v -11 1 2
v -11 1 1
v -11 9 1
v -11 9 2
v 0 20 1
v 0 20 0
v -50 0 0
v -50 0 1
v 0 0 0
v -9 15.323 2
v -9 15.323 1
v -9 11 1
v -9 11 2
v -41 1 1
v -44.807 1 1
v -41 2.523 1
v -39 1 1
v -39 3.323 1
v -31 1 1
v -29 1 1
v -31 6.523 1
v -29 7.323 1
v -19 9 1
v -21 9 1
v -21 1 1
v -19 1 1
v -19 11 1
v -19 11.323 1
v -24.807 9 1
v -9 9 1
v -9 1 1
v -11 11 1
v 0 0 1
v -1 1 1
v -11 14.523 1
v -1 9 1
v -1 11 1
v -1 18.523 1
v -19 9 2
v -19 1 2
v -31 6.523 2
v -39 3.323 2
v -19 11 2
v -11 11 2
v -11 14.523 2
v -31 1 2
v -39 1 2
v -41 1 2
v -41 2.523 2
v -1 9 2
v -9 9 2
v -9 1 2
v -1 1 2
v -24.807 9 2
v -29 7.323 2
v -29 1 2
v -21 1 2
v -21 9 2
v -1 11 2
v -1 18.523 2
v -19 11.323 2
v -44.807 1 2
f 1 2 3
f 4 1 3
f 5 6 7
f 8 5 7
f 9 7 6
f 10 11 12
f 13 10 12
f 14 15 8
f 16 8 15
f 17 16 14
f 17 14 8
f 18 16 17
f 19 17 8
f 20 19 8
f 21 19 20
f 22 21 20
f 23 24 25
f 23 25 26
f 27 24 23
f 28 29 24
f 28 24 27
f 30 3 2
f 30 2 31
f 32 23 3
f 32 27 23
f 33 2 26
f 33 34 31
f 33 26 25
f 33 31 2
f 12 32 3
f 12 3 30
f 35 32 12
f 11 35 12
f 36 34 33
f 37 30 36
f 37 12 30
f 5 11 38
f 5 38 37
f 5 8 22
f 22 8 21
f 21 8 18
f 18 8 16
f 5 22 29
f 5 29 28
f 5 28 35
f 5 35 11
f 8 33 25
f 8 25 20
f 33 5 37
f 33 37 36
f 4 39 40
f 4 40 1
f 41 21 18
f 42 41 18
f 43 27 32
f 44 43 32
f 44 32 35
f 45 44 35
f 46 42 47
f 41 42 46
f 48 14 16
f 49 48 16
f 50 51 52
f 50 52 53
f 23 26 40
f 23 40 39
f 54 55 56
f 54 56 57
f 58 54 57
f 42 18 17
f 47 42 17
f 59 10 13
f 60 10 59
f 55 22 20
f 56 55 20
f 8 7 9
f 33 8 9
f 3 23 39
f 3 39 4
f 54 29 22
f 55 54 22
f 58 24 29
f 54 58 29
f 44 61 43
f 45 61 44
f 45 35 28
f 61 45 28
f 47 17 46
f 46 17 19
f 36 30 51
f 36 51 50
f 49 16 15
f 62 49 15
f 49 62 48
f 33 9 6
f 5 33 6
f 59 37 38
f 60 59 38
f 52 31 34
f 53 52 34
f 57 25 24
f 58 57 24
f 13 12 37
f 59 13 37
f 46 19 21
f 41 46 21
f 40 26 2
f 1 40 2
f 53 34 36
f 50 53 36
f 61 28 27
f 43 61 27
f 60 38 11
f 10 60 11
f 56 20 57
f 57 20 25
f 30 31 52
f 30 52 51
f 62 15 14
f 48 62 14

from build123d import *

# Parameters (mm, degrees)
F1_DEPTH = 1
F2_W     = 8
F2_H     = 8
F3_DEPTH = 1


# Not quite as in the source:
# - a feature names something its author has since deleted; it is built from what else it names


with BuildPart() as f1:
    # F0 (on Top) → F1 (new body)
    with BuildSketch(Plane.XY):
        Polygon((0, 20), (-50, 0), (0, 0), align=None)
    extrude(amount=F1_DEPTH)

    # F2 (on face) → F3 (join)
    with BuildSketch(Plane.XY.offset(1)):
        Polygon((-19, 11.3229670386), (-19, 11), (-11, 11), (-11, 14.5229670386), align=None)
        Polygon((-29, 7.3229670386), (-29, 1), (-21, 1), (-21, 9), (-24.8074175964, 9), align=None)
        Polygon((-39, 3.3229670386), (-39, 1), (-31, 1), (-31, 6.5229670386), align=None)
        Polygon((-9, 15.3229670386), (-9, 11), (-1, 11), (-1, 18.5229670386), align=None)
        with Locations((-5, 5)):
            Rectangle(F2_W, F2_H)
        with Locations((-15, 5)):
            Rectangle(F2_W, F2_H)
        Polygon((-41, 2.5229670386), (-44.8074175964, 1), (-41, 1), align=None)
    extrude(amount=F3_DEPTH)


solid = f1.part
